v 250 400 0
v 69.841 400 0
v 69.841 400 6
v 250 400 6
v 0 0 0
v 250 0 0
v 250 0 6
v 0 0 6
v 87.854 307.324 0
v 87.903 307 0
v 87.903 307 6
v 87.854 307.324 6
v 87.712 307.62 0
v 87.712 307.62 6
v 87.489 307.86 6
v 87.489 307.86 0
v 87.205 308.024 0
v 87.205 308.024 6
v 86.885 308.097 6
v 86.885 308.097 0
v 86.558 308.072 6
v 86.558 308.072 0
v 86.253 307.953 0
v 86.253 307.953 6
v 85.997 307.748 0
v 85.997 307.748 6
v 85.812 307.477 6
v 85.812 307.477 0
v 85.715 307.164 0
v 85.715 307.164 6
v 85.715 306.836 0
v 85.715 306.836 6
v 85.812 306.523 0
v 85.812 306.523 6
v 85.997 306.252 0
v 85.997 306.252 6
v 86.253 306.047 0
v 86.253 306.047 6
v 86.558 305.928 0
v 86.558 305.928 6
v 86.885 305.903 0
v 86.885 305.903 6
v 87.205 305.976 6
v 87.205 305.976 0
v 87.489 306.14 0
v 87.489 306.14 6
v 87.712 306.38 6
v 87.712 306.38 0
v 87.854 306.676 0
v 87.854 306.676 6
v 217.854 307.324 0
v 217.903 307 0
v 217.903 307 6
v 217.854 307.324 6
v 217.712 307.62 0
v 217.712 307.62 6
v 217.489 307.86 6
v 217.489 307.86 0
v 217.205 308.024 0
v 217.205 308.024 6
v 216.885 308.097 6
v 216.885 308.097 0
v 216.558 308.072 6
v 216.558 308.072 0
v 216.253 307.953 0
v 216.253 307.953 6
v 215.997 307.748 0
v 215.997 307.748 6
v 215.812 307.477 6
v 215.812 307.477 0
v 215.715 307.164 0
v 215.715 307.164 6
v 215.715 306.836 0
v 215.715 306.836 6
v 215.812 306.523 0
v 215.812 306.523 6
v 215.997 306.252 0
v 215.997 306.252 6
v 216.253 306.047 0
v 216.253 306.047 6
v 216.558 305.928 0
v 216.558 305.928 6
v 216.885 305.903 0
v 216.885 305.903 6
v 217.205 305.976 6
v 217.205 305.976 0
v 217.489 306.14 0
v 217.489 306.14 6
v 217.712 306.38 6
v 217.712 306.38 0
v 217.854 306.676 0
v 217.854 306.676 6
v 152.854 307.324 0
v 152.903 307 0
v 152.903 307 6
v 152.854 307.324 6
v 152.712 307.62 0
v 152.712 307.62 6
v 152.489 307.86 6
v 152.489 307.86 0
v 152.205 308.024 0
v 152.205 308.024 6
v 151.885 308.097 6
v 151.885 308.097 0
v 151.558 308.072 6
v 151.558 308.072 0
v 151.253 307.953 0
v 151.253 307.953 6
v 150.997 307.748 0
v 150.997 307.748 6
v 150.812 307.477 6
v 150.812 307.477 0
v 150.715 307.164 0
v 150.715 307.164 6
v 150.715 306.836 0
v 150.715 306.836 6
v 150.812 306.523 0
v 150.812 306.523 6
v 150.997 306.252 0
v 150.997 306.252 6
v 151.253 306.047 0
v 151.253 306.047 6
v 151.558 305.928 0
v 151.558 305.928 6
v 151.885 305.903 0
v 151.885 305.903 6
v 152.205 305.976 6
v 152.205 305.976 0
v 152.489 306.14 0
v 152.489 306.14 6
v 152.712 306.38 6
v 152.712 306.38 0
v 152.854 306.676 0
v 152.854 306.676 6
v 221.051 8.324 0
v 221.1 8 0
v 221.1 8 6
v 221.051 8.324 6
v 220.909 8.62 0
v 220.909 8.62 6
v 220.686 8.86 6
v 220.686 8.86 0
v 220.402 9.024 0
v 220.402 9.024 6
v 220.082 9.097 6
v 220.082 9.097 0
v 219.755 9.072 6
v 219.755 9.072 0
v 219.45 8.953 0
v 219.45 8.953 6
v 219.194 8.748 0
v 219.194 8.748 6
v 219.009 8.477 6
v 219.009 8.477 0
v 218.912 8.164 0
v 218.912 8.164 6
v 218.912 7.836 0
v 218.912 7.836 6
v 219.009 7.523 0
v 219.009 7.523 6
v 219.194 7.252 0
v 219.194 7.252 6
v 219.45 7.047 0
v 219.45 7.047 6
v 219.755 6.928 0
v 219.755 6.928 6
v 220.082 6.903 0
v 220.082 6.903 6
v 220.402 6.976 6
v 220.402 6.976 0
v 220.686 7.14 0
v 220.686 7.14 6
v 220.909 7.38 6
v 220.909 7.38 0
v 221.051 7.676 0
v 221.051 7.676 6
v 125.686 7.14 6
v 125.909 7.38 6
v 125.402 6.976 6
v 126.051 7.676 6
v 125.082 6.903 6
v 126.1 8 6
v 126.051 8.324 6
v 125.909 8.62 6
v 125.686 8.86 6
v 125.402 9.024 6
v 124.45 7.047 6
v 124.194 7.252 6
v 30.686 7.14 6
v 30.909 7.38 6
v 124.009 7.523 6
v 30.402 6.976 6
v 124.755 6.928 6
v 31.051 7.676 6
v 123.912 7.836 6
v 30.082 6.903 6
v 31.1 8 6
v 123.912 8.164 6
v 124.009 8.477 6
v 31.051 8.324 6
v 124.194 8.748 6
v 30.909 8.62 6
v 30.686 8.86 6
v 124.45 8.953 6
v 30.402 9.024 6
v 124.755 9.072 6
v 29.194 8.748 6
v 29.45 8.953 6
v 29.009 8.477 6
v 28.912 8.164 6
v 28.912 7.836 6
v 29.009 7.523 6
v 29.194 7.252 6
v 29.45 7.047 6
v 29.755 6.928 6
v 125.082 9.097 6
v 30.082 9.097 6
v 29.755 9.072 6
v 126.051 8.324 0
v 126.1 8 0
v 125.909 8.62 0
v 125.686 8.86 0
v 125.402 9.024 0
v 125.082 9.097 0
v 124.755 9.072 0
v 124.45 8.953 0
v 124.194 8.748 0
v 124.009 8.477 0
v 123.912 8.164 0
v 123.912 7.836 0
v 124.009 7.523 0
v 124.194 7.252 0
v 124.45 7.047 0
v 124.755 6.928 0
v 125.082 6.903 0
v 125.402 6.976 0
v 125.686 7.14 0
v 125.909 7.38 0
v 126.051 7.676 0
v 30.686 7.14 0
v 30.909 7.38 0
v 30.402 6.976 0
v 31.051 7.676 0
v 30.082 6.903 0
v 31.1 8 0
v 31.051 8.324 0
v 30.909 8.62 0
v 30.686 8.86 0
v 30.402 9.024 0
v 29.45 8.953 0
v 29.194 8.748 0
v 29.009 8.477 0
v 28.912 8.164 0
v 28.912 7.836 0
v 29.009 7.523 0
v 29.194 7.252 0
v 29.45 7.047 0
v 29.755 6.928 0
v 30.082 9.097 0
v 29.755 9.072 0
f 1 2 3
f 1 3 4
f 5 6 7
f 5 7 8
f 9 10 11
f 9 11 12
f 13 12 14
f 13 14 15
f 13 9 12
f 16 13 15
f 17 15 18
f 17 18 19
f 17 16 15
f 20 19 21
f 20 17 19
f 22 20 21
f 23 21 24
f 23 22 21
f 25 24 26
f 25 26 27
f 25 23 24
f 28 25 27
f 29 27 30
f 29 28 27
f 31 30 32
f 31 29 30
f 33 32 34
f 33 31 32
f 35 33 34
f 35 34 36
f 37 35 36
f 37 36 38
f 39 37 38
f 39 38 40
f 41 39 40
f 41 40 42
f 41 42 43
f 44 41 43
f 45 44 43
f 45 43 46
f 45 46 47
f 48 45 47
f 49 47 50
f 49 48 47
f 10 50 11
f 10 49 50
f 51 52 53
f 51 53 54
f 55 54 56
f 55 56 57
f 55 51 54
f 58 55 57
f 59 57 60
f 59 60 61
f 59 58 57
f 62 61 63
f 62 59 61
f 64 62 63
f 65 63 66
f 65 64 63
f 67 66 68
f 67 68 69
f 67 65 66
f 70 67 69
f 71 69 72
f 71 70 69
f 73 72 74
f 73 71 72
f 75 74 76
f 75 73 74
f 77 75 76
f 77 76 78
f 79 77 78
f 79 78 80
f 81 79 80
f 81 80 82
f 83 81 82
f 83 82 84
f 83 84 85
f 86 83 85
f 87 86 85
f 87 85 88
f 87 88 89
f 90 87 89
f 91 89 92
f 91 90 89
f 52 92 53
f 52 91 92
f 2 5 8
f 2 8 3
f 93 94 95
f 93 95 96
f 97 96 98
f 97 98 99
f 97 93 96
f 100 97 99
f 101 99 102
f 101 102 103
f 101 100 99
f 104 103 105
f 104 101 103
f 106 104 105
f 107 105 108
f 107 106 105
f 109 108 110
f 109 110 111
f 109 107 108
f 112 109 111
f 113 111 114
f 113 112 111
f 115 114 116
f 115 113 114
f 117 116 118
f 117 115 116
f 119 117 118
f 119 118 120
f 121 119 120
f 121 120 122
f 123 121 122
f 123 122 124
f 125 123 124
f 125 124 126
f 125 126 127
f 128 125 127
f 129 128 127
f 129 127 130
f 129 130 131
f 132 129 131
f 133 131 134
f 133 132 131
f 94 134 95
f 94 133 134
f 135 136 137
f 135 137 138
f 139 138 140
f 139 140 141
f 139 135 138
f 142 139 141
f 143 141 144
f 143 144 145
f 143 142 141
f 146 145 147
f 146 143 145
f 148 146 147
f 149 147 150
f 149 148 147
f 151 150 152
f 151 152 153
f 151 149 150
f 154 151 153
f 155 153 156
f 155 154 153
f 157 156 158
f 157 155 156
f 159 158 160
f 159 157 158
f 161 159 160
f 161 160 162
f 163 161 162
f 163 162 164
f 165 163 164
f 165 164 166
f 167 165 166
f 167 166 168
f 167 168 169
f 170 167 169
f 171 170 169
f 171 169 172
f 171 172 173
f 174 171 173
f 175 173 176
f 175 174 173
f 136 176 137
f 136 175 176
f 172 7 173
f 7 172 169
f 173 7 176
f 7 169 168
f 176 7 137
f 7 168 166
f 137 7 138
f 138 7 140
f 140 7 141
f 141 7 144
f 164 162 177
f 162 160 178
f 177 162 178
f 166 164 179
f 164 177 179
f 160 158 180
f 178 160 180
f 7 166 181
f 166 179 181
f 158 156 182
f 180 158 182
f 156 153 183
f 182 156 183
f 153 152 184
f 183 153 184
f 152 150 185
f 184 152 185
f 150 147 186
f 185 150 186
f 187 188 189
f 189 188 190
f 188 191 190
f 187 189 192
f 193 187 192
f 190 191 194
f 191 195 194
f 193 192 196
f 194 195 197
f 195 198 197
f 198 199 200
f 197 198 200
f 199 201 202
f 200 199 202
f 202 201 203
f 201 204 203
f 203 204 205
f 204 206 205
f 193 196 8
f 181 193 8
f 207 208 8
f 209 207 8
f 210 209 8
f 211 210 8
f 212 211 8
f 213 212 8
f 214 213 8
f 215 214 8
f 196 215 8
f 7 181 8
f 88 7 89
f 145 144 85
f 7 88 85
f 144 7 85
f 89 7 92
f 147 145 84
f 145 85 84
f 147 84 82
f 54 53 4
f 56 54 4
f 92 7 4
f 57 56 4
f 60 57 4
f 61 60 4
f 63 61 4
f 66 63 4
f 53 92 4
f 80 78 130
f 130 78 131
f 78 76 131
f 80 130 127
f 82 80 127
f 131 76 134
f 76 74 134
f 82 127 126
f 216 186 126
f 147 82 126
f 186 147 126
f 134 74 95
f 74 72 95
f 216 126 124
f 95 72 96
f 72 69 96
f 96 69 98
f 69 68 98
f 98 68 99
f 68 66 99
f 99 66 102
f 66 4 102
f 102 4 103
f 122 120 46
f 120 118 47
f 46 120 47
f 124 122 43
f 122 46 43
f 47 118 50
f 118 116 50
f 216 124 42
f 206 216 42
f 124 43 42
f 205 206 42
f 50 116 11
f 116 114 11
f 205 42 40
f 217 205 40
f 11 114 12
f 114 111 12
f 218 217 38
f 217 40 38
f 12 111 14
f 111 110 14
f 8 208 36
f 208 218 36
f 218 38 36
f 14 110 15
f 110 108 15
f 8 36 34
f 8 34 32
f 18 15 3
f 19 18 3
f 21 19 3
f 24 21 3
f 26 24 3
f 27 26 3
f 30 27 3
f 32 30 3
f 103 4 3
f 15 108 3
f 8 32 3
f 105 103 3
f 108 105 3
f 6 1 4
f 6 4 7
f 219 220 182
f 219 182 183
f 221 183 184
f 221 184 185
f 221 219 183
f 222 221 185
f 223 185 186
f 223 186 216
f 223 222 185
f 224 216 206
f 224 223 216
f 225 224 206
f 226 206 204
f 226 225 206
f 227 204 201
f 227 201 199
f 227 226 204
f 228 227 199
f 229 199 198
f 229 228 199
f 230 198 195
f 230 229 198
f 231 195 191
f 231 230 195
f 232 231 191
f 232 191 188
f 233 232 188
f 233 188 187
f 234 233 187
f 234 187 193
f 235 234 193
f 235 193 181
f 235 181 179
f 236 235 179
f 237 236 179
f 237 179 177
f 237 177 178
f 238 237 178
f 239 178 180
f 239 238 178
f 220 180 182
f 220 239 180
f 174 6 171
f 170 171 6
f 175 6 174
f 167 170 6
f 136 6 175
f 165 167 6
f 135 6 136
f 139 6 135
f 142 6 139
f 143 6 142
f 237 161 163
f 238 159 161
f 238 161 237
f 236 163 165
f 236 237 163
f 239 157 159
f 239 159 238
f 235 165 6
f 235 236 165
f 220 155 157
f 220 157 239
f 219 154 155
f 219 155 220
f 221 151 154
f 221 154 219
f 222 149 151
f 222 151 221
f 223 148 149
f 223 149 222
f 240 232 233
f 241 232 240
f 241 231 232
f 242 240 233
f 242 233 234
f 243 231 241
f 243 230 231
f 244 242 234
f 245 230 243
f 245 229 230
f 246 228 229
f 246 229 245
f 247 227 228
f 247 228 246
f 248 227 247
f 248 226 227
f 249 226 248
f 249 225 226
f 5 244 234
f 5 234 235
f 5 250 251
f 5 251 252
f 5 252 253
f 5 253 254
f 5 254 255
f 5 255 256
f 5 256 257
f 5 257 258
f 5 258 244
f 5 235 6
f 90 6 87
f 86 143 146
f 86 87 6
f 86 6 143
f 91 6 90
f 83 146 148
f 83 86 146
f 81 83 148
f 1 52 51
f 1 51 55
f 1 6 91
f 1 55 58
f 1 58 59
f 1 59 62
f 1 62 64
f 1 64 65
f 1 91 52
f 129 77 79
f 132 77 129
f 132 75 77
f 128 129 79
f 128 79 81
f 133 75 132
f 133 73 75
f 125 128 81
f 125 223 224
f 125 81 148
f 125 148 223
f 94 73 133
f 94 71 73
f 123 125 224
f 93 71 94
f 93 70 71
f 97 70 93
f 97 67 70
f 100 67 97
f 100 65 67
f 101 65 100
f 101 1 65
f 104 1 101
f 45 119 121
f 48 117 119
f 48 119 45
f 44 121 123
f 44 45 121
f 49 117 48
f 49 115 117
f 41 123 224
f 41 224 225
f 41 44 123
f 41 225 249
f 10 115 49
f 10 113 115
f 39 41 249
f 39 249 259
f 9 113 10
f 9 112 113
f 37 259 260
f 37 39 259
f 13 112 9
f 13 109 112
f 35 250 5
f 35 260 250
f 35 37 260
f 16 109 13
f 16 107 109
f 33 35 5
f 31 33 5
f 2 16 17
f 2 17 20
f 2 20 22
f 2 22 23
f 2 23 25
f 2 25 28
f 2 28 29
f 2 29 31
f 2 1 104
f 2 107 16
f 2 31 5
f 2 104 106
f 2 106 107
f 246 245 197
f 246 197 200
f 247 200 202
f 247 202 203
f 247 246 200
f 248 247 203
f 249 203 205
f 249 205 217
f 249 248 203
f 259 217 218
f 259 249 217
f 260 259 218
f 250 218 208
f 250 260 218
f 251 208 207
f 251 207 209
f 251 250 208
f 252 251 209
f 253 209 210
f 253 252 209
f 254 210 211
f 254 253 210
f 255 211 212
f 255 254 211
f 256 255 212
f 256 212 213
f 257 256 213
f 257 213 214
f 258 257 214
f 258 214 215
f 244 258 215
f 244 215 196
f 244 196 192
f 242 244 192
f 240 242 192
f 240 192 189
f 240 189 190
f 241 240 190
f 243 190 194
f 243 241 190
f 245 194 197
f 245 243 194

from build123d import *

# Parameters (mm, degrees)
SKETCH_1_R      = 1.1
EXTRUDE_1_DEPTH = 6


with BuildPart() as part:
    # Эскиз1 → Бобышка-Вытянуть1 (new body)
    with BuildSketch(Plane.XY):
        Polygon((0, 0), (69.841269841, 400), (250, 400), (250, 0), align=None)
        with Locations((86.803174603, 307)):
            Circle(SKETCH_1_R, mode=Mode.SUBTRACT)
        with Locations((151.803174603, 307)):
            Circle(SKETCH_1_R, mode=Mode.SUBTRACT)
        with Locations((30, 8)):
            Circle(SKETCH_1_R, mode=Mode.SUBTRACT)
        with Locations((220, 8)):
            Circle(SKETCH_1_R, mode=Mode.SUBTRACT)
        with Locations((125, 8)):
            Circle(SKETCH_1_R, mode=Mode.SUBTRACT)
        with Locations((216.803174603, 307)):
            Circle(SKETCH_1_R, mode=Mode.SUBTRACT)
    extrude(amount=EXTRUDE_1_DEPTH)


solid = part.part
